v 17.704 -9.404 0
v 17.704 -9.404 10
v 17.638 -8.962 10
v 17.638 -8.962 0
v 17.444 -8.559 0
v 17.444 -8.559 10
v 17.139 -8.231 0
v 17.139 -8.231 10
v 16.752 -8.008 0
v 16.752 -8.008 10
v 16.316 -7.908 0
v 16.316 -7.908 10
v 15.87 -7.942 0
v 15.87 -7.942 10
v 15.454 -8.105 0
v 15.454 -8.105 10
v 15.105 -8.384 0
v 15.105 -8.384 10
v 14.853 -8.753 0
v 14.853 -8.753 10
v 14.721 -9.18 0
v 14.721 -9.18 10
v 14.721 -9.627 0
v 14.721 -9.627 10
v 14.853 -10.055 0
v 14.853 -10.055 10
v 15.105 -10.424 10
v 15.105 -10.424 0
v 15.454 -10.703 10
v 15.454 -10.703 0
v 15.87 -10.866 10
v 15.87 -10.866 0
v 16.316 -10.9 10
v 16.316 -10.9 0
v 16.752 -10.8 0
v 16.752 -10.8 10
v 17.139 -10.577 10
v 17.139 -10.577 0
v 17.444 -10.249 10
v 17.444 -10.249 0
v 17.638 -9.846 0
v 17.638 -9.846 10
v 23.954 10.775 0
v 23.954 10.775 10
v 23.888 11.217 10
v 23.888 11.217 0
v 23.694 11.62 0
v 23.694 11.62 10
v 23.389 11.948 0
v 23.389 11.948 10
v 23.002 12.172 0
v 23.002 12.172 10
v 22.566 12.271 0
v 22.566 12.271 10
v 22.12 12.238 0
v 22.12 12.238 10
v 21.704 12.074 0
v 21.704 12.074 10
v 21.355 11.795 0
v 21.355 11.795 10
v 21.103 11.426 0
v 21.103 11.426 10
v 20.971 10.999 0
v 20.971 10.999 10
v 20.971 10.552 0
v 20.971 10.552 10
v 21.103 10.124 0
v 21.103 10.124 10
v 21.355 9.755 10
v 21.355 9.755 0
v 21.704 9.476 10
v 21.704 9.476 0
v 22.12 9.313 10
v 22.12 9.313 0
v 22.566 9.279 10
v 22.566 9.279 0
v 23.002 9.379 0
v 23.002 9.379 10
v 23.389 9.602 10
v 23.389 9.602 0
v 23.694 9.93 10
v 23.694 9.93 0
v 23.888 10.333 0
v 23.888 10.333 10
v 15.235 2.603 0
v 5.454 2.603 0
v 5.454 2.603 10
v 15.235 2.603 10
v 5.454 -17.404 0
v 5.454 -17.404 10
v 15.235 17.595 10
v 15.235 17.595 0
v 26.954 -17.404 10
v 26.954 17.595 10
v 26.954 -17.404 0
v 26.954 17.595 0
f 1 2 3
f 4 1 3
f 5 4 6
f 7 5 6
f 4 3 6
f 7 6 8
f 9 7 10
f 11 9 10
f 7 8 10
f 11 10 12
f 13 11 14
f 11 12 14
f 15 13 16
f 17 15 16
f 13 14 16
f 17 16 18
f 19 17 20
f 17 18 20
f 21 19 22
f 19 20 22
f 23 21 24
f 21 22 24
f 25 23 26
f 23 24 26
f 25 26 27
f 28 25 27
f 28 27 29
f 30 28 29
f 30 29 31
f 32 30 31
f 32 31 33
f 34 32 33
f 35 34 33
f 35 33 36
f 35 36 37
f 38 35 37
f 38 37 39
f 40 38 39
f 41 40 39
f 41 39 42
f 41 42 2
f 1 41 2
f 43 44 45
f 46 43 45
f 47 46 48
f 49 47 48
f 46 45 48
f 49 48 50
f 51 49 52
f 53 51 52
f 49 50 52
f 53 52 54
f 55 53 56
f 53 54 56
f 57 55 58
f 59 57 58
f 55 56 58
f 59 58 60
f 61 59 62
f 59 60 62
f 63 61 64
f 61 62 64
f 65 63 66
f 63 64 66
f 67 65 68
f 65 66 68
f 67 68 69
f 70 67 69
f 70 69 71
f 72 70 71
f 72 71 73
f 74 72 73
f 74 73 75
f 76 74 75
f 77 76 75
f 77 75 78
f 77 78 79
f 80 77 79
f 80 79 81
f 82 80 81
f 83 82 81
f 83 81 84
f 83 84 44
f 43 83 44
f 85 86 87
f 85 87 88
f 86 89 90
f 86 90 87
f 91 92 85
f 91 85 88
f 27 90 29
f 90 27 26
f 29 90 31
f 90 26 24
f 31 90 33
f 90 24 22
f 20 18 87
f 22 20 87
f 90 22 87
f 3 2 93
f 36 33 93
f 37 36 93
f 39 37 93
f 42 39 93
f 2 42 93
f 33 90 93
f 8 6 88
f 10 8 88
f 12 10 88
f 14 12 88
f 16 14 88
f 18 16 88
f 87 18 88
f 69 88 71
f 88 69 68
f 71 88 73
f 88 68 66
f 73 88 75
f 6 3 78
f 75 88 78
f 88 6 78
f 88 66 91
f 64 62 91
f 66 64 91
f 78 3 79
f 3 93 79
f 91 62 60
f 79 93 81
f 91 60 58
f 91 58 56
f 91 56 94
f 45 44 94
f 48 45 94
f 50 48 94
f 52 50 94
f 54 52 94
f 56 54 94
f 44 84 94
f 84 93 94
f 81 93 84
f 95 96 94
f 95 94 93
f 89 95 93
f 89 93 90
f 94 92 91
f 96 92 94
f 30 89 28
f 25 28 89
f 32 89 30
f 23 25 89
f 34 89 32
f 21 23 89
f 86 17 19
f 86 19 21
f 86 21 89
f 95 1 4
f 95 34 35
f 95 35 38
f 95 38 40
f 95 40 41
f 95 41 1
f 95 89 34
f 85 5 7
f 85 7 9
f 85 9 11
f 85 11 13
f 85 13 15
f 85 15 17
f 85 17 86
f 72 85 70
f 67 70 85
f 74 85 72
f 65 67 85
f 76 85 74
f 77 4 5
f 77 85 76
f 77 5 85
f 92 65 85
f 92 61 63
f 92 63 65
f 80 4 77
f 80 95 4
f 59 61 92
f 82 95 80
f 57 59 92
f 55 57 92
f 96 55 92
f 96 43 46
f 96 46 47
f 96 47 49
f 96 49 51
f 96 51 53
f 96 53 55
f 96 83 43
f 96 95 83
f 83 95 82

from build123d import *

# Parameters (mm, degrees)
EXTRUDE_1_DEPTH     = 10
SKETCH_2_W          = 10.780789019
SKETCH_2_H          = 10
CUT_EXTRUDE_1_DEPTH = 6
SKETCH_3_W          = 10
SKETCH_3_H          = 18.171763081
EXTRUDE_2_DEPTH     = 1
SKETCH_4_R          = 1.5
CUT_EXTRUDE_2_DEPTH = 11
SKETCH_5_W          = 11.719210981
SKETCH_5_H          = 10
CUT_EXTRUDE_3_DEPTH = 3.18


with BuildPart() as part:
    # 草图1 → 凸台-拉伸1 (new body)
    with BuildSketch(Plane.XY):
        Polygon((7.850374618, 8.603451253), (16.234951688, 8.603451253), (16.234951688, 16.628704923), (16.234951688, 20.775214334), (26.954162669, 20.775214334), (26.954162669, -17.403924352), (5.454162669, -17.403924352), (5.454162669, 8.603451253), align=None)
    extrude(amount=EXTRUDE_1_DEPTH)

    # 草图2 → 切除-拉伸1 (cut)
    with BuildSketch(Plane(origin=(0, 8.603451253, 0), x_dir=(1, 0, 0), z_dir=(0, 1, 0))):
        with Locations((10.844557179, -5)):
            Rectangle(SKETCH_2_W, SKETCH_2_H)
    extrude(amount=-CUT_EXTRUDE_1_DEPTH, mode=Mode.SUBTRACT)

    # 草图3 → 凸台-拉伸2 (add)
    with BuildSketch(Plane.ZY.offset(-16.234951688)):
        with Locations((5, 11.689332794)):
            Rectangle(SKETCH_3_W, SKETCH_3_H)
    extrude(amount=EXTRUDE_2_DEPTH)

    # 草图4 → 切除-拉伸2 (cut, through all)
    with BuildSketch(Plane.XY.offset(10)):
        with Locations((16.204162669, -9.403924352)):
            Circle(SKETCH_4_R)
        with Locations((22.454162669, 10.775214334)):
            Circle(SKETCH_4_R)
    extrude(amount=-CUT_EXTRUDE_2_DEPTH, mode=Mode.SUBTRACT)

    # 草图5 → 切除-拉伸3 (cut)
    with BuildSketch(Plane(origin=(0, 20.775214334, 0), x_dir=(1, 0, 0), z_dir=(0, 1, 0))):
        with Locations((21.094557179, -5)):
            Rectangle(SKETCH_5_W, SKETCH_5_H)
    extrude(amount=-CUT_EXTRUDE_3_DEPTH, mode=Mode.SUBTRACT)


solid = part.part
